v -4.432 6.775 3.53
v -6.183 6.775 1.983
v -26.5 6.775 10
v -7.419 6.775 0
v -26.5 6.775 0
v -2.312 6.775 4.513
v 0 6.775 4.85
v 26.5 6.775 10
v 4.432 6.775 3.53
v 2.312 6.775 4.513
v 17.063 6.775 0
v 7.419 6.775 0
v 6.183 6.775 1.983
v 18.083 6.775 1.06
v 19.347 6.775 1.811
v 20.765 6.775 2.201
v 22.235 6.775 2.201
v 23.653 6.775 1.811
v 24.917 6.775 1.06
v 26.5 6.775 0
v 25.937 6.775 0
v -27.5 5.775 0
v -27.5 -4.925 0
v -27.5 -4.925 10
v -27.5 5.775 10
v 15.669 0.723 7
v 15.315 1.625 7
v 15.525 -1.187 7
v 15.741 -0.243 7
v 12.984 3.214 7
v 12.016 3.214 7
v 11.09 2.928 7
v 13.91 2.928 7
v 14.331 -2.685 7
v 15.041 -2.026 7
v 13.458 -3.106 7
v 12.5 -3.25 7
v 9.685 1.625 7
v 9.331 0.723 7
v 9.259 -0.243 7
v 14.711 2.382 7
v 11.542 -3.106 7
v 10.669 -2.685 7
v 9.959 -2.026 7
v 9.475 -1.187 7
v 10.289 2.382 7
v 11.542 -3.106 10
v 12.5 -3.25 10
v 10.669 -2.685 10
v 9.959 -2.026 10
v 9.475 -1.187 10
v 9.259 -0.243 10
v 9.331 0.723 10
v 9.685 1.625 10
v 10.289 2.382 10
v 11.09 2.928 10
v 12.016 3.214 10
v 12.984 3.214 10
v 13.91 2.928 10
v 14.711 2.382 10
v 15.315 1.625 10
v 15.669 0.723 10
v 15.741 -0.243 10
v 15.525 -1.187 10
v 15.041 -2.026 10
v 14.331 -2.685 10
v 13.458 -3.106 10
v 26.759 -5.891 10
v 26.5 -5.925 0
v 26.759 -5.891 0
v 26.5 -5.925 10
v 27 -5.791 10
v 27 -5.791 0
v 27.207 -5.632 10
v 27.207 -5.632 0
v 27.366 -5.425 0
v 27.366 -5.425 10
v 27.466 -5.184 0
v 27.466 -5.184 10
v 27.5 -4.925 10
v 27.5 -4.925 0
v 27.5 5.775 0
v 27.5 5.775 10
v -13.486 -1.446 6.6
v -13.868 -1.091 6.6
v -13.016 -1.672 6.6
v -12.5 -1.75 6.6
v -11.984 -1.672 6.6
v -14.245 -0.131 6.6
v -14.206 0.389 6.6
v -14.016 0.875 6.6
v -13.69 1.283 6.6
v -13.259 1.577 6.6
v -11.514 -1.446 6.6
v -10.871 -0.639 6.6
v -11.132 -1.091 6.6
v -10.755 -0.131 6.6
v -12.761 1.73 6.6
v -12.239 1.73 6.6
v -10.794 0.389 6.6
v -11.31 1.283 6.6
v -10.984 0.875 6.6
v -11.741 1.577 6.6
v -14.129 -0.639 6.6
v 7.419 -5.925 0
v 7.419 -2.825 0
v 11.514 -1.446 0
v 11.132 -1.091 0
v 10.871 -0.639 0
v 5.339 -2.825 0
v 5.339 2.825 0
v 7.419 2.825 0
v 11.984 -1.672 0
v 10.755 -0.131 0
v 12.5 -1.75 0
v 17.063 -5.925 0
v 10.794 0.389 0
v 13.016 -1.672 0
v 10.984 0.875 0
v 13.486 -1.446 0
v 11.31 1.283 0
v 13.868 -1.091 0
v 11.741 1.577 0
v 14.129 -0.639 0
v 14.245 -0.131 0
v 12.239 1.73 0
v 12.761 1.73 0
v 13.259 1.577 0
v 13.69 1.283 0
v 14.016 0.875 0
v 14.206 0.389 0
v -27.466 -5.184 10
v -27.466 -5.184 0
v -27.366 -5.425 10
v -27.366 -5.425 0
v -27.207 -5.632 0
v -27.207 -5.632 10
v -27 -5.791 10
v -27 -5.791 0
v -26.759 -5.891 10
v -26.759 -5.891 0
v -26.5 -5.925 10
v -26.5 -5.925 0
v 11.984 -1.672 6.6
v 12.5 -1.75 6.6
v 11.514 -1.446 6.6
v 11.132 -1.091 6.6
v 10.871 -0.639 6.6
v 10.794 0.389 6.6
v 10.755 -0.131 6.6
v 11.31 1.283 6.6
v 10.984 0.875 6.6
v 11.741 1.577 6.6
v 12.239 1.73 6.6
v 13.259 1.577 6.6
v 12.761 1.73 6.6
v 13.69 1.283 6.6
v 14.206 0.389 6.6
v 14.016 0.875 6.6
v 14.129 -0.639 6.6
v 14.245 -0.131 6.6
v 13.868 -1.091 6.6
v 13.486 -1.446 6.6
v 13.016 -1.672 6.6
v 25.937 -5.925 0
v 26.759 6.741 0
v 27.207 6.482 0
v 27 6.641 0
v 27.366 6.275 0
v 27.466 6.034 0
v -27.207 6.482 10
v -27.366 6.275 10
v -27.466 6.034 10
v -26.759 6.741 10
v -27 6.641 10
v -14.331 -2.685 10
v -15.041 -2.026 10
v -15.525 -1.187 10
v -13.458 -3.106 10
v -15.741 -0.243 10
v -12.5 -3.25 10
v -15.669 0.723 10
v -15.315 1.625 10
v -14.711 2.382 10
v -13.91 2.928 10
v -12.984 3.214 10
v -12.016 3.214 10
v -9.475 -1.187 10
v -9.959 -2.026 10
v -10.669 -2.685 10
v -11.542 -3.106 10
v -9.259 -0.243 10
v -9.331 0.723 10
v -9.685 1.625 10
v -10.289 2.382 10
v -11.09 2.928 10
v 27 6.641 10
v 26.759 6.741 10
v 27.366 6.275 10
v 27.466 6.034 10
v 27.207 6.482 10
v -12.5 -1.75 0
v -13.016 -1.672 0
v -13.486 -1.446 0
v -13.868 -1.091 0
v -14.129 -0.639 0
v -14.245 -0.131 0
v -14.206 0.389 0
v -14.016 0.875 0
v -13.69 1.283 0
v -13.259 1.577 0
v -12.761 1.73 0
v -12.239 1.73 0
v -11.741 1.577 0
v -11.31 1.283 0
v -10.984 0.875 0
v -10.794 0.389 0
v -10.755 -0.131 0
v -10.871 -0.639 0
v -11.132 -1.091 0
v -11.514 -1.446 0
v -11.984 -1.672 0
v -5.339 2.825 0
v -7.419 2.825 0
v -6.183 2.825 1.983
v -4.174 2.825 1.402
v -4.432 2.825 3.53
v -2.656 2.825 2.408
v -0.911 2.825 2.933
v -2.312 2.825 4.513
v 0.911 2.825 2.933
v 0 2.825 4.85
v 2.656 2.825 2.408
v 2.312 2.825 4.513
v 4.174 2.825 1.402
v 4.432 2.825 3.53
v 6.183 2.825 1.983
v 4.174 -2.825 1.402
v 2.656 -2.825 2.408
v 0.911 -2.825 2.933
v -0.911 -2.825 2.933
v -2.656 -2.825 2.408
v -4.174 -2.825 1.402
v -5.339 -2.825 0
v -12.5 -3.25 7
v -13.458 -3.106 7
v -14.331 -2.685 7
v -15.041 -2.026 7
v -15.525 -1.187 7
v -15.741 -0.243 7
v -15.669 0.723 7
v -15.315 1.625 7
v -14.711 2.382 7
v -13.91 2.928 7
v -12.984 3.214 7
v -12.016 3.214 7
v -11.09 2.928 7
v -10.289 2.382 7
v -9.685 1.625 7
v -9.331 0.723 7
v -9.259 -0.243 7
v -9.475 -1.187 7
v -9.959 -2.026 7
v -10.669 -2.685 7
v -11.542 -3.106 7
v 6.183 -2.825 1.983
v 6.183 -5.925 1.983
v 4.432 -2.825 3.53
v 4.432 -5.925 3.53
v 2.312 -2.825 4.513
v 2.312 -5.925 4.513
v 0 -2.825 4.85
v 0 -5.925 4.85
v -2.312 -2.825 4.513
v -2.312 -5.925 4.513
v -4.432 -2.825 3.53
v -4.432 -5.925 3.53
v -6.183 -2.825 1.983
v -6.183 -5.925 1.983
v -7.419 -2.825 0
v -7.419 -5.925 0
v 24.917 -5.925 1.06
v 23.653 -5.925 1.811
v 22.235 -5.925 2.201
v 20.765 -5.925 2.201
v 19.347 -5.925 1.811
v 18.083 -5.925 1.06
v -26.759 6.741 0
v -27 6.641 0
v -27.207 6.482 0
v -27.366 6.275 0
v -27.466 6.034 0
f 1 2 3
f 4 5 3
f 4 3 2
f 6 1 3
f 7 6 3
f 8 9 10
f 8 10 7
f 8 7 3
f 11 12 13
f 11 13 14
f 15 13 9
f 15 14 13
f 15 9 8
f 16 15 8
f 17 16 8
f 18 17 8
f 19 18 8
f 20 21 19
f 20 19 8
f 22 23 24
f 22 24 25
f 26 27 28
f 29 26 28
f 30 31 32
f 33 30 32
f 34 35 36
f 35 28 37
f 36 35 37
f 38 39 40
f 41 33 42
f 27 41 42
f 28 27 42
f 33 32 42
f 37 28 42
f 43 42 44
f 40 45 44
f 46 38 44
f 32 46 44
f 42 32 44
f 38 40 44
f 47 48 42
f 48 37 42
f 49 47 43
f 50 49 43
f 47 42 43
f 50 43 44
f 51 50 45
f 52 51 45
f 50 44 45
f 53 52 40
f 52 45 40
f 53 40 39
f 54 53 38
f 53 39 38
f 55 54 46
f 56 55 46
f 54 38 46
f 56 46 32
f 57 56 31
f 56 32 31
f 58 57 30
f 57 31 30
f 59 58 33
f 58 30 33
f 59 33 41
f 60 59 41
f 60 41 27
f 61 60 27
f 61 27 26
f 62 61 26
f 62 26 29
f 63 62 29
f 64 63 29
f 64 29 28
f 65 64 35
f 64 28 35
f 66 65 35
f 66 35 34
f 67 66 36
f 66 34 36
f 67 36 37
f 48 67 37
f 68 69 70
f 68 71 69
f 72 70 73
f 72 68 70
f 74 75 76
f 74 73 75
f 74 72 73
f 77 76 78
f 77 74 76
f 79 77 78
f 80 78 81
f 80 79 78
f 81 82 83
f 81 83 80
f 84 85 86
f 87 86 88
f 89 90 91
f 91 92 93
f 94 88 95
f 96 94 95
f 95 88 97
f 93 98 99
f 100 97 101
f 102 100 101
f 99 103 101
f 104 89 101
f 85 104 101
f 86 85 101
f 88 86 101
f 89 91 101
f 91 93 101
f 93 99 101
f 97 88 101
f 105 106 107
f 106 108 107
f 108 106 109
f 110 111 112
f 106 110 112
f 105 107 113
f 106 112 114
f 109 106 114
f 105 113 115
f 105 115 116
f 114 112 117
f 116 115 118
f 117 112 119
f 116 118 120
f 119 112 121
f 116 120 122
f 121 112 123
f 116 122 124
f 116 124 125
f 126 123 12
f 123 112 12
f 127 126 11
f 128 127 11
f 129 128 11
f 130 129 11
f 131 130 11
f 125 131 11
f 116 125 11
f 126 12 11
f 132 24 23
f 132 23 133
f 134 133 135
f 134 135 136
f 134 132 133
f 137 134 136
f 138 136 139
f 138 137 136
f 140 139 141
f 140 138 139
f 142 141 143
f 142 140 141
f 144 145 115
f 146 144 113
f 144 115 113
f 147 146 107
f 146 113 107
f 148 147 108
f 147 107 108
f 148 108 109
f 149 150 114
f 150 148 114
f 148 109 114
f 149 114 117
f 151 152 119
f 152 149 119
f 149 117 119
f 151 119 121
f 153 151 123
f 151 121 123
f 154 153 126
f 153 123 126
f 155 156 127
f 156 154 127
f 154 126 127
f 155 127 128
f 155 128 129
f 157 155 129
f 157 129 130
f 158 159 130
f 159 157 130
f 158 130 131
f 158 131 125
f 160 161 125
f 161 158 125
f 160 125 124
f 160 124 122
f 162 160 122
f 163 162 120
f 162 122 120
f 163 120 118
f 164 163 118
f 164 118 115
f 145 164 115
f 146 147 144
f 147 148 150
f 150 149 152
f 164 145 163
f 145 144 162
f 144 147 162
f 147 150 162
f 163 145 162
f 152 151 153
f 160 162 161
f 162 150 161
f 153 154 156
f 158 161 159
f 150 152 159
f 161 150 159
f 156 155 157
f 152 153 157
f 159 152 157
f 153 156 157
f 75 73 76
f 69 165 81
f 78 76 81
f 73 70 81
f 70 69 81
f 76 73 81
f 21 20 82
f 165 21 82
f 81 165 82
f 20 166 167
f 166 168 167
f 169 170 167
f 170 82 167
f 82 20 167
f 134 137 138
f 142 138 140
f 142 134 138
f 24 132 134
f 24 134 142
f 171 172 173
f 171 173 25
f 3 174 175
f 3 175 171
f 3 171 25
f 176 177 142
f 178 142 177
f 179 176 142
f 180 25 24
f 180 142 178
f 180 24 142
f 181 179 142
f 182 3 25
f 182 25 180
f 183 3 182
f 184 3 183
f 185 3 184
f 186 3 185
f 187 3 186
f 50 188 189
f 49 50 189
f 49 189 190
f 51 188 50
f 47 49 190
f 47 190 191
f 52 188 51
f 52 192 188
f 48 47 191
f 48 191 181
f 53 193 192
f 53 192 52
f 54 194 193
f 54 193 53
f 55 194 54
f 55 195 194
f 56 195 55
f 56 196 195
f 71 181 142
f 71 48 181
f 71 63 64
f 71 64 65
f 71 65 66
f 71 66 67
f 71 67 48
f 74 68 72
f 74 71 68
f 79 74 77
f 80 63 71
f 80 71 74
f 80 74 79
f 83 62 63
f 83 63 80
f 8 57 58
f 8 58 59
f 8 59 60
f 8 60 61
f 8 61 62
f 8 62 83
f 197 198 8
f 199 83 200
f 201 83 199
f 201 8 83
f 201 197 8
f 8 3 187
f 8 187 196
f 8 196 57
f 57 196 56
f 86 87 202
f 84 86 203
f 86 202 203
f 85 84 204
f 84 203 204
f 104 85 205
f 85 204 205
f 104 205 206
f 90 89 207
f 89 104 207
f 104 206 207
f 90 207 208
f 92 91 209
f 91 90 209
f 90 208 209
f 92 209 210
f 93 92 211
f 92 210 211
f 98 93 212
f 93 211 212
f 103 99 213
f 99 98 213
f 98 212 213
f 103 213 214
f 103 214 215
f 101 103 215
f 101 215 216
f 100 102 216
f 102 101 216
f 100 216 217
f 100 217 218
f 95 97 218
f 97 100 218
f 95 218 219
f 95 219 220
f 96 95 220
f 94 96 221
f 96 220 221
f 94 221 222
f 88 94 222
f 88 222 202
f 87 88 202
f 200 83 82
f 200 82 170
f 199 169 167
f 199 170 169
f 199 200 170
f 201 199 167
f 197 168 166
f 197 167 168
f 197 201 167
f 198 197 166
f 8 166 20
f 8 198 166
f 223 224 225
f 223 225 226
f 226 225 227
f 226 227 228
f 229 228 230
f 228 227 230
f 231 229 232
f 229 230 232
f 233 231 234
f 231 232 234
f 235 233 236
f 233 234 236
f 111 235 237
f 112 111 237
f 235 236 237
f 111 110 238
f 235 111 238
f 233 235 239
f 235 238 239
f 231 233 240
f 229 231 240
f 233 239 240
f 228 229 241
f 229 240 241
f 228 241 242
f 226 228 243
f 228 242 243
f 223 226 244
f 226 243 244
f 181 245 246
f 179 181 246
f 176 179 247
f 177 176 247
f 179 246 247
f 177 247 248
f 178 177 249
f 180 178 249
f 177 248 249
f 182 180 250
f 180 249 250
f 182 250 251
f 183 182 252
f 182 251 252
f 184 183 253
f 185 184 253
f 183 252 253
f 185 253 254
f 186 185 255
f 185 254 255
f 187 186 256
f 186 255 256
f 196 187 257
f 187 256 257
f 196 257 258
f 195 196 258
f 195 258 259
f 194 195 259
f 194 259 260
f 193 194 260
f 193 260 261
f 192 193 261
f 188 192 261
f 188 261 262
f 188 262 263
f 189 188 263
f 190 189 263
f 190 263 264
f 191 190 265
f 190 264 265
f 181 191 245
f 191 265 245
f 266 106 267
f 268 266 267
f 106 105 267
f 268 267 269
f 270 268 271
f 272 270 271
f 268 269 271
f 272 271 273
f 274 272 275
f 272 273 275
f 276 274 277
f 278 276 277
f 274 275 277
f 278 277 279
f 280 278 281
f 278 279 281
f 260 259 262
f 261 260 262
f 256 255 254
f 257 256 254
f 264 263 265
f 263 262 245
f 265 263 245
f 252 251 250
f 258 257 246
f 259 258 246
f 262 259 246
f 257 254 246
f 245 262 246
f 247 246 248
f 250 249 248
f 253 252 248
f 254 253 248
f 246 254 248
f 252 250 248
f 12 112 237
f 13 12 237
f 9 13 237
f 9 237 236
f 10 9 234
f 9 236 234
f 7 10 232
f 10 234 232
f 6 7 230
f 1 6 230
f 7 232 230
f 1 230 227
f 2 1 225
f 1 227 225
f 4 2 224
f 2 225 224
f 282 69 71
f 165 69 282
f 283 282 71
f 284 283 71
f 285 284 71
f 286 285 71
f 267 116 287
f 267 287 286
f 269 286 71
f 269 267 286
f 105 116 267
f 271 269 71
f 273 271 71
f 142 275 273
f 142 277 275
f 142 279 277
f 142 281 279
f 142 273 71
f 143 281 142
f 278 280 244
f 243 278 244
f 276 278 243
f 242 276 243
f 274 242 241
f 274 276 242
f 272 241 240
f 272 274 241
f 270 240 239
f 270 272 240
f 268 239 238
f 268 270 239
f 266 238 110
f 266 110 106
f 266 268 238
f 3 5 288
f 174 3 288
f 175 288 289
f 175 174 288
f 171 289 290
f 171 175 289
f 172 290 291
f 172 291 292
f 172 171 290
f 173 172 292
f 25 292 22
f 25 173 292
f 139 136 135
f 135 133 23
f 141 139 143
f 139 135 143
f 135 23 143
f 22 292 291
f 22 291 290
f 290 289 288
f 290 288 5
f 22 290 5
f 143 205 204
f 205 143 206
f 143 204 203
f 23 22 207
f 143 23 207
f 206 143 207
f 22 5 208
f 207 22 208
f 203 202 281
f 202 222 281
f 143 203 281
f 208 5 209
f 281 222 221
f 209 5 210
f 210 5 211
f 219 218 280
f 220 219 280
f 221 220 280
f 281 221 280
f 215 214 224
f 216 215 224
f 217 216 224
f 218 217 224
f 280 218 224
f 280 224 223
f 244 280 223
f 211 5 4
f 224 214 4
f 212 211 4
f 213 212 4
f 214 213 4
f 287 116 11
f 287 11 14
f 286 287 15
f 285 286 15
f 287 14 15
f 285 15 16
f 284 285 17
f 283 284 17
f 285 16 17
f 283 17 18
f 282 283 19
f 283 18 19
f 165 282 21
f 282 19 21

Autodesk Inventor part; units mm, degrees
ref_plane "XZ Plane" through (0, 0, 0) normal (0, 1, 0) x (-1, 0, 0)
ref_plane "XY Plane" through (0, 0, 0) normal (0, 0, 1) x (1, 0, 0)
sketch "Sketch1" plane through (0, 0, 0) normal (0, 0, 1) x (1, 0, 0)
  line L0 (-27.5, 6.775) -> (27.5, 6.775)
  line L1 (27.5, 6.775) -> (27.5, -5.925)
  line L2 (27.5, -5.925) -> (-27.5, -5.925)
  line L3 (-27.5, -5.925) -> (-27.5, 6.775)
  point P0 (0, 0)
  dimension "d0" = 6.775
  dimension "d1" = 5.925
  dimension "d2" = 27.5
  dimension "d3" = 27.5
extrude "Extrusion1" add sketch "Sketch1" along normal blind 10
ref_plane "Work Plane1" through (0, 0, -3.25) normal (0, 0, -1) x (-1, 0, 0)
sketch "Sketch2" plane through (0, 0, -3.25) normal (0, 0, -1) x (-1, 0, 0)
  line L0 (27.5, 6.775) -> (-27.5, 6.775) projected
  line L1 (-27.5, -5.925) -> (27.5, -5.925) projected
  line L2 (0, 6.775) -> (-8.1, 6.775)
  line L3 (-27.5, 6.775) -> (27.5, 6.775) projected
  line L4 (-8.1, 6.775) -> (-8.1, 2.825)
  line L5 (-8.1, 2.825) -> (-6.25, 2.825)
  line L6 (-6.25, 2.825) -> (-6.25, -2.825)
  line L7 (-6.25, -2.825) -> (-8.1, -2.825)
  line L8 (-8.1, -2.825) -> (-8.1, -5.925)
  line L9 (27.5, -5.925) -> (-27.5, -5.925) projected
  line L10 (-8.1, -5.925) -> (0, -5.925)
  line L11 (0, -5.925) -> (0, 6.775)
  line L12 (0, -8.465) -> (0, 9.315) projected
  point P0 (0, 0)
  dimension "d7" = 8.1
  dimension "d8" = 6.25
  dimension "d9" = 3.95
  dimension "d10" = 3.1
revolve "Revolution1" cut sketch "Sketch2" angle 180 about axis through (0, 0, -3.25) along (0, -1, 0)
sketch "Sketch3" plane through (0, 0, 10) normal (0, 0, 1) x (1, 0, 0)
  line L0 (0, 0) -> (43.2339, 0) construction
  line L1 (0, 0) -> (-39.8542, 0) construction
  point P0 (-12.5, 0)
  point P1 (12.5, 0)
  dimension "d12" = 12.5
  dimension "d13" = 12.5
hole "Hole1" at (-12.5, 0, 10) at (12.5, 0, 10) direction (0, 0, -1) diameter 3.5 end through all counterbore diameter 6.5 counterbore depth 3
sketch "Sketch5" plane through (-27.5, 6.775, 10) normal (0, 1, 0) x (1, 0, 0)
  arc A0 (22.1615, 10) -> (32.8385, 10) centre (27.5, 13.25) ccw projected
  line L0 (27.5, 13.25) -> (61.0026, 13.25) construction
  line L1 (55, 10) -> (55, 0) projected
  circle A1 centre (49, 13.25) radius 5.5
  point P0 (27.5, 10)
  dimension "d26" = 6
  dimension "d27" = 11
extrude "Extrusion3" cut sketch "Sketch5" against normal through all
sketch "Sketch6" plane through (-12.5, 0, 7) normal (0, 0, 1) x (1, 0, 0)
  circle A0 centre (0, 0) radius 1.75 projected
  circle A1 centre (25, 0) radius 1.75 projected
  point P0 (12.5, 0)
extrude "Extrusion4" add sketch "Sketch6" against normal blind 0.4
fillet "Fillet2" radius 1 4 edges at (-27.5, 6.775, 5) (-27.5, -5.925, 5) (27.5, 6.775, 5) (27.5, -5.925, 5)
equation "\"d3\" = d2"
equation "\"d13\" = d12"
properties part number "Retainer" material "PC/ABS Plastic"
